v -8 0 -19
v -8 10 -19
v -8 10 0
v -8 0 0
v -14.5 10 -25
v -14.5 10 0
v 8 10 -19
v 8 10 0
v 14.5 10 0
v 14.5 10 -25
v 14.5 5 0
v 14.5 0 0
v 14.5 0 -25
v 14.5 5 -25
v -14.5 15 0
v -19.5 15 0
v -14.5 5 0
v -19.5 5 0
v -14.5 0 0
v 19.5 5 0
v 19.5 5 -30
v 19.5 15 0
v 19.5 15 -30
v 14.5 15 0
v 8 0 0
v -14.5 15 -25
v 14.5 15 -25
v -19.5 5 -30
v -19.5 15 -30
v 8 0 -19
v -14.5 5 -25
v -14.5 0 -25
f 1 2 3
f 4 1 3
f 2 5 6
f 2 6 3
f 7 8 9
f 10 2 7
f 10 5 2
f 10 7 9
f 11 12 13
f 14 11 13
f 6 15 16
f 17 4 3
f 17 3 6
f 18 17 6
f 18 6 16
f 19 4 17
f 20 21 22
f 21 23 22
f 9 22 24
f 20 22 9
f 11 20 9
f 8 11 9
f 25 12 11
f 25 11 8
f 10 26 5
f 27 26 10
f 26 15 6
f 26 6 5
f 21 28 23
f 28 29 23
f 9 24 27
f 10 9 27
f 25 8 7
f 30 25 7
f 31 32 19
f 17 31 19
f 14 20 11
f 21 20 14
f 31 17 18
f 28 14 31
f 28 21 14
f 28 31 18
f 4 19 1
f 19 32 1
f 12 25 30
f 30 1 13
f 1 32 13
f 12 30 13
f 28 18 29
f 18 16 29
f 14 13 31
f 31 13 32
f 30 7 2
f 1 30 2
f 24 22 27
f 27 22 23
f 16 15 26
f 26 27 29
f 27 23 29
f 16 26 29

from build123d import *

# Parameters (mm, degrees)
EXTRUDE_1_DEPTH      = 10
EXTRUDE_2_DEPTH      = 5
EXTRUDE_2_DEPTH_BACK = 5
SKETCH_3_W           = 29
SKETCH_3_H           = 50
CUT_EXTRUDE_2_DEPTH  = 5


with BuildPart() as part:
    # 스케치1 → 보스-돌출1 (new body)
    with BuildSketch(Plane(origin=(0, 0, 0), x_dir=(1, 0, 0), z_dir=(0, 1, 0))):
        Polygon((-14.5, 0), (-8, 0), (-8, 19), (8, 19), (8, 0), (14.5, 0), (14.5, 25), (-14.5, 25), align=None)
    extrude(amount=EXTRUDE_1_DEPTH)

    # 스케치2 → 보스-돌출2 (add, two sides)
    with BuildSketch(Plane(origin=(0, 10, 0), x_dir=(1, 0, 0), z_dir=(0, 1, 0))) as extrude_2_sk:
        Polygon((-8, 0), (-19.5, 0), (-19.5, 30), (19.5, 30), (19.5, 0), (8, 0), (8, 19), (-8, 19), align=None)
    extrude(amount=EXTRUDE_2_DEPTH)
    extrude(extrude_2_sk.sketch, amount=-EXTRUDE_2_DEPTH_BACK)

    # 스케치3 → 컷-돌출2 (cut)
    with BuildSketch(Plane(origin=(0, 15, 0), x_dir=(1, 0, 0), z_dir=(0, 1, 0))):
        Rectangle(SKETCH_3_W, SKETCH_3_H)
    extrude(amount=-CUT_EXTRUDE_2_DEPTH, mode=Mode.SUBTRACT)


solid = part.part
